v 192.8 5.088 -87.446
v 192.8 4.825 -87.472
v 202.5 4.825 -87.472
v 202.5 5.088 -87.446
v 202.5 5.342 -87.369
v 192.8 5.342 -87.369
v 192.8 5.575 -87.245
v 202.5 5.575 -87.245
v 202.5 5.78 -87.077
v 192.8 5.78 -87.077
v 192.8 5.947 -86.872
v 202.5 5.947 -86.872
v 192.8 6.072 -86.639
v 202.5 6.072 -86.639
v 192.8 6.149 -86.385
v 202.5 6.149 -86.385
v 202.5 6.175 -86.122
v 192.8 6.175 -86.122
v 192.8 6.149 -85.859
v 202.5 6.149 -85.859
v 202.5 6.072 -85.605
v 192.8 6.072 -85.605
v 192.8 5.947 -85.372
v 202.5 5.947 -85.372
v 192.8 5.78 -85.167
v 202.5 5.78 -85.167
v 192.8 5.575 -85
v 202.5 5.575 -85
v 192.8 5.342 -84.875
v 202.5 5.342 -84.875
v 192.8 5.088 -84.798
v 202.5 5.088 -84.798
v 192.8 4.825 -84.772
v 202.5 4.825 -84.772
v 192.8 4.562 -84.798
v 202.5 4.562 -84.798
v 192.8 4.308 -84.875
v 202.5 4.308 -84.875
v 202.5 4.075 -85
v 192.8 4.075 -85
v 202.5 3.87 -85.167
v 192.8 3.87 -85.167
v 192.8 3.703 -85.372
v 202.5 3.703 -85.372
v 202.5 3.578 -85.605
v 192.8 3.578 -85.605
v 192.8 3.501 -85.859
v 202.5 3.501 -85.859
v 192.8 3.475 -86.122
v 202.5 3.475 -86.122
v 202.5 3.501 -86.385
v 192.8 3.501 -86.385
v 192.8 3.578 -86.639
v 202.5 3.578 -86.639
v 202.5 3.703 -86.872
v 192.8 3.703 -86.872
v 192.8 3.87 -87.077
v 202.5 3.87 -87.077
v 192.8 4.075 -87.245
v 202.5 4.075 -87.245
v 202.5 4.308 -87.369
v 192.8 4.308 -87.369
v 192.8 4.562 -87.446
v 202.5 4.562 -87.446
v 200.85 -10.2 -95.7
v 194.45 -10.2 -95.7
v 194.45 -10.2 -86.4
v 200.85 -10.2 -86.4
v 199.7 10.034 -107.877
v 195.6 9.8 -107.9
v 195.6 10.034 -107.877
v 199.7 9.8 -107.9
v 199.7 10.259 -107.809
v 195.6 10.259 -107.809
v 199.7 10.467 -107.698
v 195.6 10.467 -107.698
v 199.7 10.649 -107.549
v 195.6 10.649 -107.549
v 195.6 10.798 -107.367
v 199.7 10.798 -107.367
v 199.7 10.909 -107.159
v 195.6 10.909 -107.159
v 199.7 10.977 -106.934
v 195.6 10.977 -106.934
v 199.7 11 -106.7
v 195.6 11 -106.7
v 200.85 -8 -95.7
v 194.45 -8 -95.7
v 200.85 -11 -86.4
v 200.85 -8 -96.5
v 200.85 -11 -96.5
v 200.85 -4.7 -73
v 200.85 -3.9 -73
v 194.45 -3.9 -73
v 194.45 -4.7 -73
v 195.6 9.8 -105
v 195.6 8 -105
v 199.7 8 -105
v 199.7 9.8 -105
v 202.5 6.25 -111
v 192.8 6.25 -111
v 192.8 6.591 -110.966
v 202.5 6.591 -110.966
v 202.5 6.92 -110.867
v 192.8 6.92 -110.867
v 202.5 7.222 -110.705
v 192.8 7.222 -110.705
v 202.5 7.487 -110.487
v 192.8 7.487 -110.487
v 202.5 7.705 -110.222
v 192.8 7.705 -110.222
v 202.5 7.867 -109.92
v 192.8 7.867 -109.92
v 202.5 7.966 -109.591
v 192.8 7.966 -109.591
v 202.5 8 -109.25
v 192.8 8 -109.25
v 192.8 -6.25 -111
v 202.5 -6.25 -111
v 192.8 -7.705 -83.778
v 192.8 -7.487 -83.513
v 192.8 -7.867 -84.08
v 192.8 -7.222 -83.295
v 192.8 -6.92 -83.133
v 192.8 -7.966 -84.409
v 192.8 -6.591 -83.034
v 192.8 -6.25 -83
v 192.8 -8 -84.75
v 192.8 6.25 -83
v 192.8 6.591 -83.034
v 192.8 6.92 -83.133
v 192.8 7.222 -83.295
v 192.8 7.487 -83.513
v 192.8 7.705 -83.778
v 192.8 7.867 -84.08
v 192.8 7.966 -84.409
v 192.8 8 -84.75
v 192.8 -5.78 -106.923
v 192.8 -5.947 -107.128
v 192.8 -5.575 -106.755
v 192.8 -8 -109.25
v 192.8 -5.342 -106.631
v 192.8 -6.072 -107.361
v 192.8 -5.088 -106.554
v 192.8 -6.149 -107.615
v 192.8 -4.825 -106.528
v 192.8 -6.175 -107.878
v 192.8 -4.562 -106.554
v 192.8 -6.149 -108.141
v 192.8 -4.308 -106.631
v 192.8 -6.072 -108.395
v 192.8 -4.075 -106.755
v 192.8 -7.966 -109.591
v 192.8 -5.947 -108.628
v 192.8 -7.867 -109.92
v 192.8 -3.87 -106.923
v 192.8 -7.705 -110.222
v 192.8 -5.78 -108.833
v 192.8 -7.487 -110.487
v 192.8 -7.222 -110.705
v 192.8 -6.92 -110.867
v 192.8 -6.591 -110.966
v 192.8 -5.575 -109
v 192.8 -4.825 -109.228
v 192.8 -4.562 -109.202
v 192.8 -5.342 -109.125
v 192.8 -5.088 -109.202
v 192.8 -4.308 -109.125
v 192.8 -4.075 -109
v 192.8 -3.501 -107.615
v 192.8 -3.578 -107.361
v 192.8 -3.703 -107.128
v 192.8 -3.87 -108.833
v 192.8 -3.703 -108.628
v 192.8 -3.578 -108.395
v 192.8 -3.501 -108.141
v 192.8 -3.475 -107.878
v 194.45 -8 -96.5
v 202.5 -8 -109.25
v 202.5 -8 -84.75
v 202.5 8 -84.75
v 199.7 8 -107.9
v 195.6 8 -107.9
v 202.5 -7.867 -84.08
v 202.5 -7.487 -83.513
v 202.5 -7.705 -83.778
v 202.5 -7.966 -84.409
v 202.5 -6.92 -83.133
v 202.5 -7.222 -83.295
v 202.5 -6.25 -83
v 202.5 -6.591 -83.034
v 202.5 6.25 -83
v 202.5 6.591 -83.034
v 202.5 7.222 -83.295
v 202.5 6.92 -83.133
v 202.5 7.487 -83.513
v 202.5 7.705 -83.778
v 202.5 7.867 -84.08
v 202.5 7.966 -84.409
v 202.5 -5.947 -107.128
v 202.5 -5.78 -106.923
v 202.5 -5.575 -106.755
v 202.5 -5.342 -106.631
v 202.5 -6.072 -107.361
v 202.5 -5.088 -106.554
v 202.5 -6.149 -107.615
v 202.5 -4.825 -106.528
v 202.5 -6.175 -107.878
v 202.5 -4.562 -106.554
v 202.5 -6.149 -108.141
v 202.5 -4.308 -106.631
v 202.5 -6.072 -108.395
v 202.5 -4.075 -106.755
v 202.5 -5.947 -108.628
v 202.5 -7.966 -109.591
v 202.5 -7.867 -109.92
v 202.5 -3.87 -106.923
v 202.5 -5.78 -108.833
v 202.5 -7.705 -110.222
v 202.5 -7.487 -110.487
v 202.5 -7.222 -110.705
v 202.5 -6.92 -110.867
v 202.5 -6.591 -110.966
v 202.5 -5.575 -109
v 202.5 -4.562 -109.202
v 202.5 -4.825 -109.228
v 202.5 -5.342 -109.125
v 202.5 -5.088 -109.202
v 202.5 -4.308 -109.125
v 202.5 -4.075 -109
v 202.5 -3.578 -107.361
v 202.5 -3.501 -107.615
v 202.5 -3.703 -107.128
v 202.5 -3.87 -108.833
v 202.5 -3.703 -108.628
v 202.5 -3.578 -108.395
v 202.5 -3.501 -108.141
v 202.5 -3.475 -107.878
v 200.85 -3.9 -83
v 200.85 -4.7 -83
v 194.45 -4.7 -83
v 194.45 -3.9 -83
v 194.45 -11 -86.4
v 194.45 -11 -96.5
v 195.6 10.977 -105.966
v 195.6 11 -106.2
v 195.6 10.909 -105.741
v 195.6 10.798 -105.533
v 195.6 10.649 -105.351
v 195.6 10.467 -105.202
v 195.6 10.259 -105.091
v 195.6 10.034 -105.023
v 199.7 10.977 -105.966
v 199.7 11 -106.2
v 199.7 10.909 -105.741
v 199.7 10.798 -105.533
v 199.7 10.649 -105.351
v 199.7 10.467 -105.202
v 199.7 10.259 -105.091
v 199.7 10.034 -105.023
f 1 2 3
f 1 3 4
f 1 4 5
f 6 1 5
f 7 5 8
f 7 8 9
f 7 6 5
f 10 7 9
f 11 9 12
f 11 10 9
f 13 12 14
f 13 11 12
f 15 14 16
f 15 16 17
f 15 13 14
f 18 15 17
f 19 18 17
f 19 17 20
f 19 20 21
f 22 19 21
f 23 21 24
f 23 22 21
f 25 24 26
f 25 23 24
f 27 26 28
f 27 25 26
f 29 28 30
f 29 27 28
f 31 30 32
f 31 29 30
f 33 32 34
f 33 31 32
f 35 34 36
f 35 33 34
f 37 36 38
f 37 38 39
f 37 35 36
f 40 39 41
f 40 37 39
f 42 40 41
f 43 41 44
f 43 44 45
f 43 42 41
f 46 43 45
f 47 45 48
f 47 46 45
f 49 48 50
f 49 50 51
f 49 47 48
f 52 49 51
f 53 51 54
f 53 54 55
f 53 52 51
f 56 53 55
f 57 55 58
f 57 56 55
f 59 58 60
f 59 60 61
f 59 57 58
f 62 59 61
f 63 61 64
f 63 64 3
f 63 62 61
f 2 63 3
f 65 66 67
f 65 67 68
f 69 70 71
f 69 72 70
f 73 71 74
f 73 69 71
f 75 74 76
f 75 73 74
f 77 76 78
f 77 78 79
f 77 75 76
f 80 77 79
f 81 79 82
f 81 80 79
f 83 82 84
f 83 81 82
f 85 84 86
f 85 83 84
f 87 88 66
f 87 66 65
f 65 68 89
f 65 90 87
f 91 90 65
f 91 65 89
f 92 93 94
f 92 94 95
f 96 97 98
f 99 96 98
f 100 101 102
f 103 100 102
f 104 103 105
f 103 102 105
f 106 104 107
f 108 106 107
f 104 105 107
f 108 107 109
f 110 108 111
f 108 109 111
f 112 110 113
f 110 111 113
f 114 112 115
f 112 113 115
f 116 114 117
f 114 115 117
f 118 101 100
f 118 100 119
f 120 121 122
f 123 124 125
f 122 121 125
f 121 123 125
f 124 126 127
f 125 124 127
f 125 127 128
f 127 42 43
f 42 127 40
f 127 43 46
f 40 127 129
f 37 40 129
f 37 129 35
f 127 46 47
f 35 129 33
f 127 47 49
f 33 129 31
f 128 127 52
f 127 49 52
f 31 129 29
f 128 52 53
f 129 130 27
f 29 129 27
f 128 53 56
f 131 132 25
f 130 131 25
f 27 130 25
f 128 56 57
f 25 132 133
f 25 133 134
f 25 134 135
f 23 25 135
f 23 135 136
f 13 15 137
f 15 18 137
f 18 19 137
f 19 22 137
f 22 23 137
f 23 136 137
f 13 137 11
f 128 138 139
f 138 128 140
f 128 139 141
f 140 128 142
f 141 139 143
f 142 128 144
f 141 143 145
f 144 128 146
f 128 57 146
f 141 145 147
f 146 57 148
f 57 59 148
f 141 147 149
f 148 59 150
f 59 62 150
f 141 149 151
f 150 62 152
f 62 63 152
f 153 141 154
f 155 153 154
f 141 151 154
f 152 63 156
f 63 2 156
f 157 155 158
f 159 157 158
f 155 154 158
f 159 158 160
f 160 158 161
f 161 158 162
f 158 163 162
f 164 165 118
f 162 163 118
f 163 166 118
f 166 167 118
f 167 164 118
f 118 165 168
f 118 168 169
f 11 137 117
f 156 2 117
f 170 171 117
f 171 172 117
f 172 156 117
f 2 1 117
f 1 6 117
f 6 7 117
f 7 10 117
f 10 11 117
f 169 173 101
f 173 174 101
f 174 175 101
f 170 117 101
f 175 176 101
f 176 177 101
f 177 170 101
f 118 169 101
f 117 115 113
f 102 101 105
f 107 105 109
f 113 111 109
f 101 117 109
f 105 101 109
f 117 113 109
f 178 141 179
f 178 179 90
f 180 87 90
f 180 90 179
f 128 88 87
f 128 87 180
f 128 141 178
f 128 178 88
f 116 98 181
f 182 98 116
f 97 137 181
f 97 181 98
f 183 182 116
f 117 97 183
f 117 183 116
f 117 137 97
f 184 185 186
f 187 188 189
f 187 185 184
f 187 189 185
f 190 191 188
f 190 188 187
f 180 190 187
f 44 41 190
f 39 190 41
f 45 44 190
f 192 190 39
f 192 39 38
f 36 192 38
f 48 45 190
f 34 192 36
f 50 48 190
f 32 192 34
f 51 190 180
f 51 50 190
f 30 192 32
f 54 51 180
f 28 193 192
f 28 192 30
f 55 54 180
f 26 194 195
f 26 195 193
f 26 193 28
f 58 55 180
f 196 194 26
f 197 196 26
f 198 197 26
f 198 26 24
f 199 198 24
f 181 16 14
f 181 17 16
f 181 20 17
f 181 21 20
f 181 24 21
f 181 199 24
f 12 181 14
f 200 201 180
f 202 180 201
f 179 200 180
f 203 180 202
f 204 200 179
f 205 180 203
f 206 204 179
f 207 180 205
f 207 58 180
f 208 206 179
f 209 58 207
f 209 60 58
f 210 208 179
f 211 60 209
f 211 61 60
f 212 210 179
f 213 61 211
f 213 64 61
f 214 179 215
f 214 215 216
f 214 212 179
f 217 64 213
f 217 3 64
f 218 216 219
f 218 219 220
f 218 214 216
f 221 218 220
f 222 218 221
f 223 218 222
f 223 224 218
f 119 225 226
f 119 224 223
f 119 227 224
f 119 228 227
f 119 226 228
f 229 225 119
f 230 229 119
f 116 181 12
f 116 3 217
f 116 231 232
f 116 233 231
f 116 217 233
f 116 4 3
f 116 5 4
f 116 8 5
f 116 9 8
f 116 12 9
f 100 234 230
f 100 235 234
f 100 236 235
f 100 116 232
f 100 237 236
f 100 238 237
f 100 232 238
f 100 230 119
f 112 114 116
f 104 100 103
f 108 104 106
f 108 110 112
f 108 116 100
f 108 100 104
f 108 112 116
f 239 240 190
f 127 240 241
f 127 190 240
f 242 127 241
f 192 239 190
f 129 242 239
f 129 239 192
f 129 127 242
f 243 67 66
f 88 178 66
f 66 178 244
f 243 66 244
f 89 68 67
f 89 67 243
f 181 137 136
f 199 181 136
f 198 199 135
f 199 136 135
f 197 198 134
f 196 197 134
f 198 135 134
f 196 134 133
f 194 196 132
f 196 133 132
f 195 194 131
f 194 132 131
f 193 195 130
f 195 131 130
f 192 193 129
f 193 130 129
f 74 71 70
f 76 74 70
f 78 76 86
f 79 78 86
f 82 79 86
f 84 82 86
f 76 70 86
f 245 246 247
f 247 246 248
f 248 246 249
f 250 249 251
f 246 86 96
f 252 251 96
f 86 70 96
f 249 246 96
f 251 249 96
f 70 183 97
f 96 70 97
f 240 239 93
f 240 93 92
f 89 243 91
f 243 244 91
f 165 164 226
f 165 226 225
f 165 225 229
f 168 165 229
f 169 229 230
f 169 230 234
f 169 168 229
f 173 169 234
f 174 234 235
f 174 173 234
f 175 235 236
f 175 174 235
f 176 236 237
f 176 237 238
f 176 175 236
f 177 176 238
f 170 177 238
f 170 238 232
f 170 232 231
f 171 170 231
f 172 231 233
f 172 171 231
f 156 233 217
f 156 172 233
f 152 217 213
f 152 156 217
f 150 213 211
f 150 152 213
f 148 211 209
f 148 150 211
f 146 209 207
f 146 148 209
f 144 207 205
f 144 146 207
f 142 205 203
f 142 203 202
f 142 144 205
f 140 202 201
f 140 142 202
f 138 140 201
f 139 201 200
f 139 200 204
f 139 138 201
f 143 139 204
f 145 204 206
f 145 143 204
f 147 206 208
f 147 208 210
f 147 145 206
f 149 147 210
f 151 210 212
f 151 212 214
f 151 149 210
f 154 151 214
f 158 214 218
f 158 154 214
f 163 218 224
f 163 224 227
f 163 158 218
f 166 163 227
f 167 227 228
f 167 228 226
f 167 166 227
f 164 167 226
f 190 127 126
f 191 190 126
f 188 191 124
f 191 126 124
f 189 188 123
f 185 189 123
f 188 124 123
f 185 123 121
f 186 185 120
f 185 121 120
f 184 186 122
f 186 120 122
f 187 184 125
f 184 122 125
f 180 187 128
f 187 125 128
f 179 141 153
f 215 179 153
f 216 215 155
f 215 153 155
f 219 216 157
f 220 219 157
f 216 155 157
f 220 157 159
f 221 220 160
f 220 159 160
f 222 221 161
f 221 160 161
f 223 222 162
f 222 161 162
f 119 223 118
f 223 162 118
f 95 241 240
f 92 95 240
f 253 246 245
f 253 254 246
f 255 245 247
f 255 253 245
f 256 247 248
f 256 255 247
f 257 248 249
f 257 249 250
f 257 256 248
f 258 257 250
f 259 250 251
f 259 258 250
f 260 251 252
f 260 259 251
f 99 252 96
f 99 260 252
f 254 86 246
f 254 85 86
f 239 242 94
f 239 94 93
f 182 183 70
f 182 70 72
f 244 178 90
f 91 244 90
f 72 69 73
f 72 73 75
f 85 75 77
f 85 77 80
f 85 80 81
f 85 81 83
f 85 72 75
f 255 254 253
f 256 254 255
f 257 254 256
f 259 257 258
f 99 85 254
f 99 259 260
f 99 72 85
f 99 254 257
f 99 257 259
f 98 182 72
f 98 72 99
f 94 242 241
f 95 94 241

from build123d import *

# Parameters (mm, degrees)
SKETCH051_R             = 1.35
PAD051_DEPTH            = 9.7
SKETCH052_W             = 2.9
SKETCH052_H             = 4.1
PAD052_DEPTH            = 3
SKETCH053_W             = 0.8
SKETCH053_H             = 6.4
PAD053_DEPTH            = 10
SKETCH054_W             = 0.8
SKETCH054_H             = 6.4
PAD054_DEPTH            = 3
SKETCH055_W             = 0.8
SKETCH055_H             = 6.4
PAD055_DEPTH            = 9.3
FILLET007_R             = 1.2
BODY011_PLACEMENT_ANGLE = 90


with BuildPart() as part:
    # Sketch051 → Pad051 (new body)
    with BuildSketch(Plane.XY):
        with BuildLine():
            ThreePointArc((-12.25, 8), (-13.487437, 7.487437), (-14, 6.25))
            Line((-14, -6.25), (-14, 6.25))
            ThreePointArc((-14, -6.25), (-13.487437, -7.487437), (-12.25, -8))
            Line((12.25, -8), (-12.25, -8))
            ThreePointArc((12.25, -8), (13.487437, -7.487437), (14, -6.25))
            Line((14, 6.25), (14, -6.25))
            ThreePointArc((14, 6.25), (13.487437, 7.487437), (12.25, 8))
            Line((-12.25, 8), (12.25, 8))
        make_face()
        with Locations((10.877931, -4.825)):
            Circle(SKETCH051_R, mode=Mode.SUBTRACT)
        with Locations((-10.877931, 4.825)):
            Circle(SKETCH051_R, mode=Mode.SUBTRACT)
    extrude(amount=PAD051_DEPTH)

    # Sketch052 (on Face8 of Pad051) → Pad052 (join)
    with BuildSketch(Plane(origin=(0, 8, 0), x_dir=(-1, 0, 0), z_dir=(0, 1, 0))):
        with Locations((-9.45, 4.85)):
            Rectangle(SKETCH052_W, SKETCH052_H)
    extrude(amount=PAD052_DEPTH)

    # Sketch053 (on Face3 of Pad052) → Pad053 (join)
    with BuildSketch(Plane(origin=(-14, 0, 0), x_dir=(0, -1, 0), z_dir=(-1, 0, 0))):
        with Locations((4.3, 4.85)):
            Rectangle(SKETCH053_W, SKETCH053_H)
    extrude(amount=PAD053_DEPTH)

    # Sketch054 (on Face16 of Pad053) → Pad054 (join)
    with BuildSketch(Plane.XZ.offset(8)):
        with Locations((-0.9, 4.85)):
            Rectangle(SKETCH054_W, SKETCH054_H)
    extrude(amount=PAD054_DEPTH)

    # Sketch055 (on Face23 of Pad054) → Pad055 (join)
    with BuildSketch(Plane(origin=(-1.3, 0, 0), x_dir=(0, -1, 0), z_dir=(-1, 0, 0))):
        with Locations((10.6, 4.85)):
            Rectangle(SKETCH055_W, SKETCH055_H)
    extrude(amount=PAD055_DEPTH)

    # Fillet007
    fillet007_edges = [part.edges().sort_by_distance(p)[0] for p in [
        (10.9, 11, 4.85),
        (8, 11, 4.85),
    ]]
    fillet(fillet007_edges, radius=FILLET007_R)


with BuildPart() as part_1:
    # Body011 placement: moved
    add(part.part.moved(Location((192.8, 0, -97))).rotate(Axis((192.8, 0, -97), (0, 1, 0)), BODY011_PLACEMENT_ANGLE))


solid = part_1.part
